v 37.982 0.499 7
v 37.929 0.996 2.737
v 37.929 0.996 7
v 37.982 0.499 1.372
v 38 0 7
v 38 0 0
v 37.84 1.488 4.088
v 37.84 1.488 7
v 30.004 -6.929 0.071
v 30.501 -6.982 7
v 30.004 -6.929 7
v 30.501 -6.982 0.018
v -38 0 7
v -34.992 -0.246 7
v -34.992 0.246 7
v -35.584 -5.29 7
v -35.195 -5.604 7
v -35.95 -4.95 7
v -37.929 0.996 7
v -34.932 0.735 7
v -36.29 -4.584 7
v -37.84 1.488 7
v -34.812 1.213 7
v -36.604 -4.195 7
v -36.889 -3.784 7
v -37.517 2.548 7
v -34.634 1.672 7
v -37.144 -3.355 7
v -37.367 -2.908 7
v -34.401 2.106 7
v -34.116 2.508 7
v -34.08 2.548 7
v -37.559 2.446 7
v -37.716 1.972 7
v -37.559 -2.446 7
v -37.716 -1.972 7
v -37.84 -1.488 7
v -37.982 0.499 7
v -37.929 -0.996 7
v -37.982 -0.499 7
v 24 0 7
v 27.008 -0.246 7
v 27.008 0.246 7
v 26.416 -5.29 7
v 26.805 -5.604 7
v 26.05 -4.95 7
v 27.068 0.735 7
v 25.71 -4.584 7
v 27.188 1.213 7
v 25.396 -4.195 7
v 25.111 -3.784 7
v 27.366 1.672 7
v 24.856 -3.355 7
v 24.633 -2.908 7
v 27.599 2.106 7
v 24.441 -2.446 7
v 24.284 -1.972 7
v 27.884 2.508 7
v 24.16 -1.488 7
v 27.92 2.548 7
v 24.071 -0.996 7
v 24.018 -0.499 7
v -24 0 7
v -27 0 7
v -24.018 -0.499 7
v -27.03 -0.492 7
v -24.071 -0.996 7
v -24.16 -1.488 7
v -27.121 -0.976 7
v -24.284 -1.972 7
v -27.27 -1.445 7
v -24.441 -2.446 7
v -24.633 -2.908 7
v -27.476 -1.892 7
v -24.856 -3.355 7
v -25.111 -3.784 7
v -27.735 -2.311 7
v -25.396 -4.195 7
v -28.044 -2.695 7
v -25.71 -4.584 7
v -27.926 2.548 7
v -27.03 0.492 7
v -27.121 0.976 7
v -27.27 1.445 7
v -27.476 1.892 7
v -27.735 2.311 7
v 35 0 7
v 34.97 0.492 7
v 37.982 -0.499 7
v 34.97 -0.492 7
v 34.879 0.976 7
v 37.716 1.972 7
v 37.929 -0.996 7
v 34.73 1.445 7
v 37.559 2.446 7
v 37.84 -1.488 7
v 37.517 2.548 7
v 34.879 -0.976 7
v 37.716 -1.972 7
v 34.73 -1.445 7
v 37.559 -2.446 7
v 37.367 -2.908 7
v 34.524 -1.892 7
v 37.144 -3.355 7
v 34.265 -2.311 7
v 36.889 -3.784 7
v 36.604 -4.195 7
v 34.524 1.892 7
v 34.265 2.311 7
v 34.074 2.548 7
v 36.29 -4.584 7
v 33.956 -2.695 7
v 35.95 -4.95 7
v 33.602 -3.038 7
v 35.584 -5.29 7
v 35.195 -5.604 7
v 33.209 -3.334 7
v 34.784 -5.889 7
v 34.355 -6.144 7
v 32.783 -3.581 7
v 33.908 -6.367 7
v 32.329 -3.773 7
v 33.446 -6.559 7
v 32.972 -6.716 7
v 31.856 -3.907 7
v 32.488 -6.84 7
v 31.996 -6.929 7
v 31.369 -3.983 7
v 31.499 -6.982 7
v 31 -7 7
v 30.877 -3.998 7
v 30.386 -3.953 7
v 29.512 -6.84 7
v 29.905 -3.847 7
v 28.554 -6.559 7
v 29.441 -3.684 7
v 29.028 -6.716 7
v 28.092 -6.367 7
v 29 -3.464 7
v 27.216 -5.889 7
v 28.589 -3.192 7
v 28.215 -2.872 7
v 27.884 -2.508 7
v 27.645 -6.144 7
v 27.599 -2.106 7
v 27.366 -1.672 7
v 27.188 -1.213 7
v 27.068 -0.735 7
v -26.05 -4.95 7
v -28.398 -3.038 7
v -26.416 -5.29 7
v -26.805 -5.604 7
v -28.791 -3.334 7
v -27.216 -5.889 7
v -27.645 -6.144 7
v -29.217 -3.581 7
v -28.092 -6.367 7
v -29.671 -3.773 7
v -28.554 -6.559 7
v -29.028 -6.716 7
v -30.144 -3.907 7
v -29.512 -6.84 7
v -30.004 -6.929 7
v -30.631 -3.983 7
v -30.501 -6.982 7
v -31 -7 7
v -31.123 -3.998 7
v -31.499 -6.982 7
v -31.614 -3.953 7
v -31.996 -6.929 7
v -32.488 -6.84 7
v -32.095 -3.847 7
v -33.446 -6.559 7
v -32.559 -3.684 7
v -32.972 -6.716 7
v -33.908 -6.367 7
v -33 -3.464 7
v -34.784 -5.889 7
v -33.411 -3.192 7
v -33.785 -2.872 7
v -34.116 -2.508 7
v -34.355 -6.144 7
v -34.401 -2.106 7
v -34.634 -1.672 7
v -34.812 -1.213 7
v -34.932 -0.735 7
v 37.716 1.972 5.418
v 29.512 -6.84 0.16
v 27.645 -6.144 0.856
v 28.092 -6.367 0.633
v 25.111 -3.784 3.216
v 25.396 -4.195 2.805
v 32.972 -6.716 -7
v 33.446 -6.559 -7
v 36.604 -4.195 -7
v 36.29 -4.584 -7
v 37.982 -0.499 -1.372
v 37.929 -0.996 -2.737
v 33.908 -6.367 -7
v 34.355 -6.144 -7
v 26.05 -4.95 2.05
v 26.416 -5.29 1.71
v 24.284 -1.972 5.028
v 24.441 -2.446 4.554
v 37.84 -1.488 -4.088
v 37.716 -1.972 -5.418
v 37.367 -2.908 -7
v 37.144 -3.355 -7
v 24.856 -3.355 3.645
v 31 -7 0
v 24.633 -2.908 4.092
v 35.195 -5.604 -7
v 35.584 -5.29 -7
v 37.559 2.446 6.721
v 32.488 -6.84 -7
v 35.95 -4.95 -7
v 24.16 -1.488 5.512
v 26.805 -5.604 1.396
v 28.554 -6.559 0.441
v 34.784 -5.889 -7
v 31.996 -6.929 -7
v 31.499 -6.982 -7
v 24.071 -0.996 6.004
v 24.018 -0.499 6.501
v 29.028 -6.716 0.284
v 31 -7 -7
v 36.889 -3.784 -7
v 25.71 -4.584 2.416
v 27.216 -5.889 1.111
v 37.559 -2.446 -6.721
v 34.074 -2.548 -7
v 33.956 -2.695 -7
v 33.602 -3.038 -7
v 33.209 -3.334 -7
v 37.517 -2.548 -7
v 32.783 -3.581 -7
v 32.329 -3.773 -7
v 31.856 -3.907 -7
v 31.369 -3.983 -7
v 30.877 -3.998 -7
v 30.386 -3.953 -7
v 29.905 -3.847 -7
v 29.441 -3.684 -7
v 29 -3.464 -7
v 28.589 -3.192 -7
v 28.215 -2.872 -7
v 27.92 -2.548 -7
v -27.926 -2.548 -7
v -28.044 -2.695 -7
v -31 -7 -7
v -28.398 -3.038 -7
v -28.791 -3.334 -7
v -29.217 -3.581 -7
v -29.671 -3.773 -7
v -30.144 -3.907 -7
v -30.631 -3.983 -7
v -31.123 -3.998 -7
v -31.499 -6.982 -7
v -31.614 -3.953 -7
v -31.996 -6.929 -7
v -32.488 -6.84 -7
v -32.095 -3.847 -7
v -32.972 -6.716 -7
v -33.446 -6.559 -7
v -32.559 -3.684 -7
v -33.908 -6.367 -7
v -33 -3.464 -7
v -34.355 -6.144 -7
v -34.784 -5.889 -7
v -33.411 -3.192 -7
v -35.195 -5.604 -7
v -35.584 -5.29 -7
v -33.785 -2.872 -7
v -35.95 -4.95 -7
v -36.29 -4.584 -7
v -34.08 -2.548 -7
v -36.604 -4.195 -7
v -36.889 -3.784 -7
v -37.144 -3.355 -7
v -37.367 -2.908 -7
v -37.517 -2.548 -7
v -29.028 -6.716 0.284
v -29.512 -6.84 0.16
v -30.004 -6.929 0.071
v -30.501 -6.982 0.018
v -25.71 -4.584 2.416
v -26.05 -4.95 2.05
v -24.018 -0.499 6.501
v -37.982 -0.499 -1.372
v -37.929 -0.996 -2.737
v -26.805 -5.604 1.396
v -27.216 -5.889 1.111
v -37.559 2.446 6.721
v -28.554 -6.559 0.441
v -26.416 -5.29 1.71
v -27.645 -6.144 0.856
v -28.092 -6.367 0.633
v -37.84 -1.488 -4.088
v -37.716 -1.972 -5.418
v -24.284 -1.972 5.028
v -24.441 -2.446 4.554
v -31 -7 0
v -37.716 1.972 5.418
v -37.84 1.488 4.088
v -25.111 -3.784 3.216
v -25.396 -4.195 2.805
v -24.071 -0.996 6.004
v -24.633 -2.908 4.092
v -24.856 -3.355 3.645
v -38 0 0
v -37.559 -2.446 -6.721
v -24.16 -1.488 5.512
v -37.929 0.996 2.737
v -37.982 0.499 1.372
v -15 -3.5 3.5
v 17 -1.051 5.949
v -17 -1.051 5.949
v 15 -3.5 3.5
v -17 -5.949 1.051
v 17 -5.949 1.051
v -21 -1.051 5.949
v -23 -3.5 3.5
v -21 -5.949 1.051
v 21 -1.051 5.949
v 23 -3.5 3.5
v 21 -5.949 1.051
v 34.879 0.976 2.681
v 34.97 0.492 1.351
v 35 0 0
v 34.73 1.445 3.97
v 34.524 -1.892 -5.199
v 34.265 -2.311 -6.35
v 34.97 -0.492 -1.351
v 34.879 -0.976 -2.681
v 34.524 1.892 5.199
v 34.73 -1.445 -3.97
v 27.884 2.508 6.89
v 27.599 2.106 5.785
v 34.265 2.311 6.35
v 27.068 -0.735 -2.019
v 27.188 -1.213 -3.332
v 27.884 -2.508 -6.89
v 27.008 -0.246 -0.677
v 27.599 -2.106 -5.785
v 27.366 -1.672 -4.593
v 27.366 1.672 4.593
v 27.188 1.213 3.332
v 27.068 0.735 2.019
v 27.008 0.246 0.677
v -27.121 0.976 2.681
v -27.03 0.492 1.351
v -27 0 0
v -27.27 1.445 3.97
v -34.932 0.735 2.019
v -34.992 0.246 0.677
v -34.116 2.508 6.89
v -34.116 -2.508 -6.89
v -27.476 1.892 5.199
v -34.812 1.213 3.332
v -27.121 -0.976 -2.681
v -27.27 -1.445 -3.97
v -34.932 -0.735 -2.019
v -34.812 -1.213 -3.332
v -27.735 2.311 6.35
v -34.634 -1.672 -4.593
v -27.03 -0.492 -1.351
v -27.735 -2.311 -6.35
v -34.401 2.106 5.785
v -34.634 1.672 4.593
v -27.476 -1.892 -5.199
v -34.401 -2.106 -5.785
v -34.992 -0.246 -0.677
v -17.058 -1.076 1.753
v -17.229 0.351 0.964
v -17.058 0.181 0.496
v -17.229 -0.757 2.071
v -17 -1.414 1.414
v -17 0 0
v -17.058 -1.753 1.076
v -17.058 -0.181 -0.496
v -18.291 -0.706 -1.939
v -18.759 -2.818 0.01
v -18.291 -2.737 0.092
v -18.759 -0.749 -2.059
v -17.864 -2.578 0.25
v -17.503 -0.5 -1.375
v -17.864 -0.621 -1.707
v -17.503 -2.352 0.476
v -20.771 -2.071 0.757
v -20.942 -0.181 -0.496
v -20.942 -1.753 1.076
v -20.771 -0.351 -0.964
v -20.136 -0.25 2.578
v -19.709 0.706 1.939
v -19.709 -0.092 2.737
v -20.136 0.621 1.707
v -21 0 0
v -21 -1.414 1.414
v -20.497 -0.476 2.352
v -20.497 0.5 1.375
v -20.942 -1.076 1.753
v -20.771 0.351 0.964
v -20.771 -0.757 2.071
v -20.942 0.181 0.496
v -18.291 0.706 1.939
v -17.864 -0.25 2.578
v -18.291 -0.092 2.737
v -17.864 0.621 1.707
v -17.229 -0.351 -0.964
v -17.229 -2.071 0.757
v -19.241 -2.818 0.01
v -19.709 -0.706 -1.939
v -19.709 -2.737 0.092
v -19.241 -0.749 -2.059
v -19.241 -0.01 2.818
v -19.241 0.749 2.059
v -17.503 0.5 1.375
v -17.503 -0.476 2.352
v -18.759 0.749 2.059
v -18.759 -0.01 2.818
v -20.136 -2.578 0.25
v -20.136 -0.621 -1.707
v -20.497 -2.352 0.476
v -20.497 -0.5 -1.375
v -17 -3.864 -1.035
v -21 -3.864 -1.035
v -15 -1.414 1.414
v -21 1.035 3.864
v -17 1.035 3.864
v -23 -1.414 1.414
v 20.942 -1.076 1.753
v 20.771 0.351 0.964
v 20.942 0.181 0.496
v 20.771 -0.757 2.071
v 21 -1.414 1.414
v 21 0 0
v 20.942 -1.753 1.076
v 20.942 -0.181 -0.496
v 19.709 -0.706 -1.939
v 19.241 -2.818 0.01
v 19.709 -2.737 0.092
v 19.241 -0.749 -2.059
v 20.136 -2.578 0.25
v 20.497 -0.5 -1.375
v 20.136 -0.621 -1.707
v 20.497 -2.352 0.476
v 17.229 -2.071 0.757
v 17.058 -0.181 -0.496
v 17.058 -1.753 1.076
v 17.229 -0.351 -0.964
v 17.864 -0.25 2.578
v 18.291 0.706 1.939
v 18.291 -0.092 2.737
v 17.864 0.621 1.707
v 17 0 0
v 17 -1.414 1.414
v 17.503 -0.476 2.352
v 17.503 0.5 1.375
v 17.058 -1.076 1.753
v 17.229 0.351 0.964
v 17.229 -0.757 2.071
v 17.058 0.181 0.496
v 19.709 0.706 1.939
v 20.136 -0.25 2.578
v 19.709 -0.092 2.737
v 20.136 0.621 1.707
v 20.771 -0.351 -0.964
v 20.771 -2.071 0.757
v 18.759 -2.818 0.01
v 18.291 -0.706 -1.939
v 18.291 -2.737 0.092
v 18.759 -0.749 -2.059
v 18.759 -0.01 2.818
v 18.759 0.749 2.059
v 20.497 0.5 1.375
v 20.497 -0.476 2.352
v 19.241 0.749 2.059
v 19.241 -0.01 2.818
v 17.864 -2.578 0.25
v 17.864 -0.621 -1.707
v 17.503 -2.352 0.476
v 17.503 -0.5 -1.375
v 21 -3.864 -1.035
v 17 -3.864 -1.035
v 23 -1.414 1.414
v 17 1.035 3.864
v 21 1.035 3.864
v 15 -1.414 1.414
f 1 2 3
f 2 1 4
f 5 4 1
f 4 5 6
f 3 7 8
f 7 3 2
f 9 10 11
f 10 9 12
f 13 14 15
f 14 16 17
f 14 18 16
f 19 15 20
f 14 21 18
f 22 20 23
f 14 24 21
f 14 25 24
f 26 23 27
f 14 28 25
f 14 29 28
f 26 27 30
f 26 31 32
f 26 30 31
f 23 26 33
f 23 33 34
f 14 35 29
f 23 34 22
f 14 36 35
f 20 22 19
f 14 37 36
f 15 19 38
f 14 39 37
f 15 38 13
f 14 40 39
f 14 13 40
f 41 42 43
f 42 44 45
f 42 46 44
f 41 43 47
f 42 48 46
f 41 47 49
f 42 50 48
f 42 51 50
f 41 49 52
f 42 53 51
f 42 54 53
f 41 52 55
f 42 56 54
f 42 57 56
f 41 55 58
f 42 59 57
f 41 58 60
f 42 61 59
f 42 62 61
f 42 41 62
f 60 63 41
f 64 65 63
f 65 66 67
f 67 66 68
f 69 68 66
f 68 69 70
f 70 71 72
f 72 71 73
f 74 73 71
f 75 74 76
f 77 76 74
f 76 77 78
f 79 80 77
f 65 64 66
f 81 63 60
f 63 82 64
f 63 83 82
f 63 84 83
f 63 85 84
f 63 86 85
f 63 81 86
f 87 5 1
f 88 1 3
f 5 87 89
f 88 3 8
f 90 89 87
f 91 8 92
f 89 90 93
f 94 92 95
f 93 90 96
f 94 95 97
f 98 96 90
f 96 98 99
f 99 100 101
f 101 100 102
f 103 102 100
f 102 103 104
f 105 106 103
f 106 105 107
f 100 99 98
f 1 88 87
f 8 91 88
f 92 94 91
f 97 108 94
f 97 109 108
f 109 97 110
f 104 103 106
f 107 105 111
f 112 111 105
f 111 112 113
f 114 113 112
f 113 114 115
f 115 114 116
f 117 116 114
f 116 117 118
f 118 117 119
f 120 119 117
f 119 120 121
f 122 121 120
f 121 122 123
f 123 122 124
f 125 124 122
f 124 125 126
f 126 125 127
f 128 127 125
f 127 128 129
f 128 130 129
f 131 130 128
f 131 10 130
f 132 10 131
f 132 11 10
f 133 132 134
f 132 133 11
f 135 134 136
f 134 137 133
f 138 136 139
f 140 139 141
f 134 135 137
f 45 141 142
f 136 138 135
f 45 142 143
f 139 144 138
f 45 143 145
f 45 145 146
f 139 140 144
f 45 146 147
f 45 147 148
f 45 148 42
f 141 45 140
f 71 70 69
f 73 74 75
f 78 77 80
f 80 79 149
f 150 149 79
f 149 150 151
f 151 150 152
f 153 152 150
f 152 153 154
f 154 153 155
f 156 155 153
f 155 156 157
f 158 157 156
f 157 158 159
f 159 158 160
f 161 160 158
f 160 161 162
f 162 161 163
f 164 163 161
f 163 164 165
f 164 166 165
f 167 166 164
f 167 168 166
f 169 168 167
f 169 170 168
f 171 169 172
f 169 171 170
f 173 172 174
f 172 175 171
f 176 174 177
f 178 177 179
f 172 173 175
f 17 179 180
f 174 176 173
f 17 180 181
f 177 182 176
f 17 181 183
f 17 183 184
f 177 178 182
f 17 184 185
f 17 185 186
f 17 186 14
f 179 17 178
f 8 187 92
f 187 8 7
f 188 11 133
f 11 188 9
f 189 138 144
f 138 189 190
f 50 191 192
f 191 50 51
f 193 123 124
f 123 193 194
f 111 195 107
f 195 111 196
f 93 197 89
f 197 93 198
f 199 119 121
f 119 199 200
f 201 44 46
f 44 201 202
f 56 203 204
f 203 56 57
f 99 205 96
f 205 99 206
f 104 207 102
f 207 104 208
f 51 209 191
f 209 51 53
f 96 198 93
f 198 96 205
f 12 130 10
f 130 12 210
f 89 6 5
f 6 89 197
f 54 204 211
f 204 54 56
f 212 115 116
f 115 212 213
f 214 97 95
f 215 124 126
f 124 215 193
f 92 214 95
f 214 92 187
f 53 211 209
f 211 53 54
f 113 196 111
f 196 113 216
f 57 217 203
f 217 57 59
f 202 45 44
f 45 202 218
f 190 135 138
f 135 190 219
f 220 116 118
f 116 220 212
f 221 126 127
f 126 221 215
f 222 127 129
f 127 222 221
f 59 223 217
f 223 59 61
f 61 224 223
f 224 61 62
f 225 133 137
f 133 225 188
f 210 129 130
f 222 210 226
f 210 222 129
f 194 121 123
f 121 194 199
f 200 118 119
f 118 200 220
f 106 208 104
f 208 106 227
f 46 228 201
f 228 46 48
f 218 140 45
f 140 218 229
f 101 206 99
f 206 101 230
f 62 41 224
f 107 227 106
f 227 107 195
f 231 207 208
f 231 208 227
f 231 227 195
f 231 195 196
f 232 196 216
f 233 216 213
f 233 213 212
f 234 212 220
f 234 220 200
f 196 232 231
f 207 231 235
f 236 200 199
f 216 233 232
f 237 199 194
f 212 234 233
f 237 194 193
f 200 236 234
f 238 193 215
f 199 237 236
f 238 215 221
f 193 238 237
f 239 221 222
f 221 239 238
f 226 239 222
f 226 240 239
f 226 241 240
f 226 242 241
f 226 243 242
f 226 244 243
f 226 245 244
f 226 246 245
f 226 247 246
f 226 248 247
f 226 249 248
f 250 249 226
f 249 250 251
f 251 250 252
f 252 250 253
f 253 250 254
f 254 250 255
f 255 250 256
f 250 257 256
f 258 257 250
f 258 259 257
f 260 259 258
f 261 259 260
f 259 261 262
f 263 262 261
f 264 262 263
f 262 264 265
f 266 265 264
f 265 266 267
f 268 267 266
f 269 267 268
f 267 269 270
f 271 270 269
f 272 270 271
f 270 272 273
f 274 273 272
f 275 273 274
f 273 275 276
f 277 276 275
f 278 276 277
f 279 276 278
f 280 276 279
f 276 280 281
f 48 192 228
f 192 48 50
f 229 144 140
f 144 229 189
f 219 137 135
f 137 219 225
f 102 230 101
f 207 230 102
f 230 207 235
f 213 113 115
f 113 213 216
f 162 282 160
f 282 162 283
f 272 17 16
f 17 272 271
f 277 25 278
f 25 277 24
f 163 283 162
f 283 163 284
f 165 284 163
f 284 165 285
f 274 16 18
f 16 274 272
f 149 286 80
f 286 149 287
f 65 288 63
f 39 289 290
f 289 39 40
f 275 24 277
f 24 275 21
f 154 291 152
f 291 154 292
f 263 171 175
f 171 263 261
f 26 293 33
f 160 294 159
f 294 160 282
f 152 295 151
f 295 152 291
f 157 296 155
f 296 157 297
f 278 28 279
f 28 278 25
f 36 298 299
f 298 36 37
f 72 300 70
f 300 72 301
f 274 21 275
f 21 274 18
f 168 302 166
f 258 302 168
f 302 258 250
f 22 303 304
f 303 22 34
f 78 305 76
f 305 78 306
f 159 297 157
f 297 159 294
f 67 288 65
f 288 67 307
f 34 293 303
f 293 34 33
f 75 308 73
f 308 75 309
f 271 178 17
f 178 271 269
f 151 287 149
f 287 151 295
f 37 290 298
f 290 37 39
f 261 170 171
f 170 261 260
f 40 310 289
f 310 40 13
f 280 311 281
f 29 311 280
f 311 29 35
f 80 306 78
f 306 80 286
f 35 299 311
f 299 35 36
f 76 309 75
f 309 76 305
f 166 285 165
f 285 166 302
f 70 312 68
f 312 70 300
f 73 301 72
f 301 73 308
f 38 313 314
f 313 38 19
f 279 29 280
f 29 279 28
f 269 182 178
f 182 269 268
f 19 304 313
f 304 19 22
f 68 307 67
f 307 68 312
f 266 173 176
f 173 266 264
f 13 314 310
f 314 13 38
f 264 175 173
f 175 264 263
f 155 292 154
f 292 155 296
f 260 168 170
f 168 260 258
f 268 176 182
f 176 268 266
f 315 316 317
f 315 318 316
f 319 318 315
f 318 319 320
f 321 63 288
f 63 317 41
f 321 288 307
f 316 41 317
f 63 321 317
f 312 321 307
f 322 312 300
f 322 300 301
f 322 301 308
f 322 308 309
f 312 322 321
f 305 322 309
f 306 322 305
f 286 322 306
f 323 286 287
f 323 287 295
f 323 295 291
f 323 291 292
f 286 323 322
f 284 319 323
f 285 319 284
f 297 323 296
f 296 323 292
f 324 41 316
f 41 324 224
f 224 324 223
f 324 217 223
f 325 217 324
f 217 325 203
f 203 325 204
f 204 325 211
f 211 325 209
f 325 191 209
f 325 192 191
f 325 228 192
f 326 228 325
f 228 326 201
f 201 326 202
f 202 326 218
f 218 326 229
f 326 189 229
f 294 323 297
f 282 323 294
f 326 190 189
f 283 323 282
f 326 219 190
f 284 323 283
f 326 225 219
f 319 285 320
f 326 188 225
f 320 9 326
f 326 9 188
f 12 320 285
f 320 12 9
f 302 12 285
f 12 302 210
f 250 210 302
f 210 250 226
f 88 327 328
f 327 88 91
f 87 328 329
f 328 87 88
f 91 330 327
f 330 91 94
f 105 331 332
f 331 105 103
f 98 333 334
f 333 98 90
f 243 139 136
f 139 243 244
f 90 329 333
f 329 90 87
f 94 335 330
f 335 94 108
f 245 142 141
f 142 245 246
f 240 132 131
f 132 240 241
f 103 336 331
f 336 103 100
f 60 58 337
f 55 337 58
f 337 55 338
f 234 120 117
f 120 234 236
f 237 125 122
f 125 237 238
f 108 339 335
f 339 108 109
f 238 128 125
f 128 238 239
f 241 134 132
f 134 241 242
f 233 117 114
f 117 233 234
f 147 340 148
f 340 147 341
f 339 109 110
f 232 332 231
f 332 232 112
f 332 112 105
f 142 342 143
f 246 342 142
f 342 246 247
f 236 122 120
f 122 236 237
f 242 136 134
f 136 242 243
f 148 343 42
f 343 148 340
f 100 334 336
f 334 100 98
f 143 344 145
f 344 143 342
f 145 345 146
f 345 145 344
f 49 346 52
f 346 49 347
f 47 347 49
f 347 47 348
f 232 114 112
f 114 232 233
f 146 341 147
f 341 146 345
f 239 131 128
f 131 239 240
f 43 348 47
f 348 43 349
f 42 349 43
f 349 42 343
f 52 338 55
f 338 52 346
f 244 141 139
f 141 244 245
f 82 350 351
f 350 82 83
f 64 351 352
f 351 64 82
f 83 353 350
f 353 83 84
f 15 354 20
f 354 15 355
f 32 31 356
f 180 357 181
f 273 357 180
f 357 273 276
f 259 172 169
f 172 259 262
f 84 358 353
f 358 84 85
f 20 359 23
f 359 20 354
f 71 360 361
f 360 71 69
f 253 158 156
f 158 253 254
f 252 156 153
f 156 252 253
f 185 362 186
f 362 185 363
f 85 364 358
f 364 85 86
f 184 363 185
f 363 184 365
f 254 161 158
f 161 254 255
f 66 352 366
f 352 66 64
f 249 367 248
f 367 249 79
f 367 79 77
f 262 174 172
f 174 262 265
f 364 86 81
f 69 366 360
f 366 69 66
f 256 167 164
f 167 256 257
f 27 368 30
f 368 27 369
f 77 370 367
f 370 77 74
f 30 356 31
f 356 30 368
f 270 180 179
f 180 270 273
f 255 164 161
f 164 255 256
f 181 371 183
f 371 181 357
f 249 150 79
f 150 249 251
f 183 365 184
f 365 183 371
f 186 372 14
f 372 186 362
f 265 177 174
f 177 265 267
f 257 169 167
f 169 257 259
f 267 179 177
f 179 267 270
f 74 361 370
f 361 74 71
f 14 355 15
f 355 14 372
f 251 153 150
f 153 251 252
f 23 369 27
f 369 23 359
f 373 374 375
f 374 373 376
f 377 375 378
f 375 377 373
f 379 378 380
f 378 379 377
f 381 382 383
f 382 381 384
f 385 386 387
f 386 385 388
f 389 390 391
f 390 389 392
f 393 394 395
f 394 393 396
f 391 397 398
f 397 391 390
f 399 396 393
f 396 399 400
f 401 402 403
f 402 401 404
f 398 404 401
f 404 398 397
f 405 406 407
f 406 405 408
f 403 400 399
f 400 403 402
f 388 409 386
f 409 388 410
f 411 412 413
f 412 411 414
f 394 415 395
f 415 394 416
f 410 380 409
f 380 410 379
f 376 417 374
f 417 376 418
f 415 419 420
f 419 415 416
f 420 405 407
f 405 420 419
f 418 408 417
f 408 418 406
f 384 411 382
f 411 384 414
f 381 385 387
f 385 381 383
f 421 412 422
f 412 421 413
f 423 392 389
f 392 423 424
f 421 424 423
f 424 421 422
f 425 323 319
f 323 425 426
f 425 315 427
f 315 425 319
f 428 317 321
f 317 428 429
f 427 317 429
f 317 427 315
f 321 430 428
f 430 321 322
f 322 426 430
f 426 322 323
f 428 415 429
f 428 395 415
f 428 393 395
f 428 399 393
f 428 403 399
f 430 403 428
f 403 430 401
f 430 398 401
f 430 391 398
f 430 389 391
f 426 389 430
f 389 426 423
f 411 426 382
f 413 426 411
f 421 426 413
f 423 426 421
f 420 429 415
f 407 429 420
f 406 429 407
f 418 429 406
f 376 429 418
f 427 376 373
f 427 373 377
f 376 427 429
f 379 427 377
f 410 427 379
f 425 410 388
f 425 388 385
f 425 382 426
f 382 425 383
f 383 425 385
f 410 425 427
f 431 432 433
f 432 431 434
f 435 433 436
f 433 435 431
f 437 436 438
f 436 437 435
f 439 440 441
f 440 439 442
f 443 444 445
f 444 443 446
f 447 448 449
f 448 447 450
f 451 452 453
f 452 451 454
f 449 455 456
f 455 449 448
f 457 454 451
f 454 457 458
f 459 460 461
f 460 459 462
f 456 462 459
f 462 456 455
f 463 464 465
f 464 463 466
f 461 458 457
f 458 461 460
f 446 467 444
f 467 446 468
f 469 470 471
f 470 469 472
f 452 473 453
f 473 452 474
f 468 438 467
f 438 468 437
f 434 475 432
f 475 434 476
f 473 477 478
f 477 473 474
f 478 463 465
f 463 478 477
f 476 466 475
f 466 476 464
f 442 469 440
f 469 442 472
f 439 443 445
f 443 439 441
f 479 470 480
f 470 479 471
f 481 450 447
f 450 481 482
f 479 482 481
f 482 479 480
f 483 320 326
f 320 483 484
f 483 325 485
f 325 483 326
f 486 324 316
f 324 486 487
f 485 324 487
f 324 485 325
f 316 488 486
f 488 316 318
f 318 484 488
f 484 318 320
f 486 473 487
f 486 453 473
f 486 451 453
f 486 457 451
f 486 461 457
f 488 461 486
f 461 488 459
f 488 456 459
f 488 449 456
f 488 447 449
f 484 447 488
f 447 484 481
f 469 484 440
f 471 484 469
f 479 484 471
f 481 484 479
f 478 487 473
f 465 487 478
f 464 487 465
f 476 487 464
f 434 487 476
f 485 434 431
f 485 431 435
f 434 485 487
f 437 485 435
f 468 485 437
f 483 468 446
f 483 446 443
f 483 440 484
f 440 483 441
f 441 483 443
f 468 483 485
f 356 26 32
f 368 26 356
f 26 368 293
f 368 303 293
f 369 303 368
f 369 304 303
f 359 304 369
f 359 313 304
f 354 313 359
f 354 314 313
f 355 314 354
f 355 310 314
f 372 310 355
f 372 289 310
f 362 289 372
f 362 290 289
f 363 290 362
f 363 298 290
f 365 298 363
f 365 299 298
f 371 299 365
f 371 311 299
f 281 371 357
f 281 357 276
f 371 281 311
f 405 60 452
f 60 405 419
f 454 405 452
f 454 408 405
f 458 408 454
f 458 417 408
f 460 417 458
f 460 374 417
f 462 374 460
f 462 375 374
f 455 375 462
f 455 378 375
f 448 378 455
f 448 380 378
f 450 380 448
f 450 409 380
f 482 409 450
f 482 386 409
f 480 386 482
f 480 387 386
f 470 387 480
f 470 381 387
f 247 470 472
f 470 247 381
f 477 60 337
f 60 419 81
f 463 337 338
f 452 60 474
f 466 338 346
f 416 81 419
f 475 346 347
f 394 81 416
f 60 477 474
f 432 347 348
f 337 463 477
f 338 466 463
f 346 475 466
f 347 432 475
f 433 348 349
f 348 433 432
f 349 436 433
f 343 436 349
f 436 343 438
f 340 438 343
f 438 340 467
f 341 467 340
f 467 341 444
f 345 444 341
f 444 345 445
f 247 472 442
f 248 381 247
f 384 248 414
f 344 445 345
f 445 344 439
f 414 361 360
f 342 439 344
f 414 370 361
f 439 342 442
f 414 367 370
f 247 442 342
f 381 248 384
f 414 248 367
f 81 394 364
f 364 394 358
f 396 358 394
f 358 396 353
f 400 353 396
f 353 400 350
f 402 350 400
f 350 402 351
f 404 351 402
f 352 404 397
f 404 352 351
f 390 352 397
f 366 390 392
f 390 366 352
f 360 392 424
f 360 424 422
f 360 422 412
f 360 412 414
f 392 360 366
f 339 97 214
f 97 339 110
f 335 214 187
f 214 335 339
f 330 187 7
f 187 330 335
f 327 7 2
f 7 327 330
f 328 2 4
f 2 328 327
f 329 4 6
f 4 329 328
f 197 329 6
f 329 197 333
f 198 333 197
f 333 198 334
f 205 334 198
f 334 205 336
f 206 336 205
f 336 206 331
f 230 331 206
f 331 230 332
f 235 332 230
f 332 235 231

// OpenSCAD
// Upper rail parts of OpenAutoLab: mounting brackets for valves, for pumps and for electronic enclosure
//
// Copyright (c) 2023-2024 Kauzerei <mailto:openautolab@kauzerei.de>
//
// This program is free software: you can redistribute it and/or modify
// it under the terms of the GNU General Public License as published by
// the Free Software Foundation, either version 3 of the License, or
// (at your option) any later version.
//
// This program is distributed in the hope that it will be useful,
// but WITHOUT ANY WARRANTY; without even the implied warranty of
// MERCHANTABILITY or FITNESS FOR A PARTICULAR PURPOSE. See the
// GNU General Public License for more details.
//
// You should have received a copy of the GNU General Public License
// along with this program. If not, see <https://www.gnu.org/licenses/>.

$fs=0.5/1;
$fa=1/1;
part = "Valve_bracket"; // [Valve_bracket, Main_pump_bracket, Filter_pump_type1_bracket, Filter_pump_type2_bracket, Filter_attachment, Small_bracket, battery_holder]
/* [Rail general parameters] */
rod_diameter=8;
rods_distance=62;

/* [mounts parameters] */
part_width=10;
part_thickness=3;
air_gap=1;
valve_offset=0;
pump_offset=5;
mount_hole=4;
mount_hole_distance=38;
pcb_angle=15;
pcb_holes_distance=67.32;
extra_room=7;

/* [Filter attachment options] */
filter_wall=6;
offset_v=20;
offset_h=12;
hole=9;

battery_h=78;
battery_w=78;
battery_d=23;

module hole() { //hole for clamping with threaded screw
  cylinder(d=mount_hole,h=2*rods_distance,center=true);
  mirror([0,0,1])cylinder(d=mount_hole*2,h=2*rods_distance,$fn=6);
}

module pumpholes() {
  translate([rods_distance/2,0,0])circle(d=rod_diameter);
  translate([-rods_distance/2,0,0])circle(d=rod_diameter);
  translate([0,10])rotate([0,0,-50]) {
    translate([31,0])circle(d=4);
    translate([-21,0])circle(d=4);
    translate([0,0])circle(d=34);
  }
}

module main_pump_bracket() {
  pumpmounts=[[21,0],[-31,0]];
  rodmounts=[[rods_distance/2,0],[-rods_distance/2,0]];
  shift=[-5,-6];
  rotation=140;
  pumpdiameter=34;
  difference() {
    union() {
      hull() {
        translate(shift)rotate([0,0,rotation])for (i=pumpmounts) translate(i)cylinder(h=part_width,d=mount_hole+2*part_thickness,center=true);
        for (i=rodmounts) translate(i)cylinder(h=part_width,d=rod_diameter+2*part_thickness,center=true);
        translate(shift)rotate([0,0,rotation])cylinder(h=part_width,d=pumpdiameter+2*part_thickness,center=true);
      }
      translate(shift)rotate([0,0,rotation])for (i=pumpmounts) translate(i)translate([0,0,pump_offset/2])cylinder(h=part_width+pump_offset,d=mount_hole+2*part_thickness,center=true);
    }
    translate(shift)rotate([0,0,rotation])for (i=pumpmounts) translate(i)cylinder(h=part_width+2*pump_offset+0.02,d=mount_hole,center=true);
    for (i=rodmounts) translate(i)cylinder(h=part_width+0.02,d=rod_diameter,center=true);
    translate(shift)rotate([0,0,rotation])cylinder(h=part_width+2*pump_offset+0.02,d=pumpdiameter,center=true);
    cube([2*rods_distance,air_gap,part_width+2],center=true);
    *translate([18,0,0])rotate([90,0,-10]) cylinder (d=4,h=2*rods_distance,center=true);
    rotate([-90,0,-14])translate([18,0,-part_thickness]) hole();
  }
}

module pump_shape(type) {
  if (type==1) hull(){
    circle(d=34);
    translate([17,-9])circle(d=8);
    translate([17,9])circle(d=8);
    translate([-17,-9])circle(d=8);
    translate([-17,9])circle(d=8);
  }
  if (type==2) hull(){
    translate([14,-14])circle(d=8);
    translate([-14,-14])circle(d=8);
    translate([14,14])circle(d=8);
    translate([-14,14])circle(d=8);
  }
}

module filterpump(type) {
  difference() {
    linear_extrude(height=part_width,convexity=4)difference() {
      offset (r=part_thickness) hull() {
        pump_shape(type);
        translate([rods_distance/2,9])circle(d=rod_diameter);
        translate([-rods_distance/2,9])circle(d=rod_diameter);
      }
    pump_shape(type);
    translate([rods_distance/2,9])circle(d=rod_diameter);
    translate([-rods_distance/2,9])circle(d=rod_diameter);
    translate([0,9])square([2*rods_distance,1],center=true);
    }
  translate([rods_distance/2-rod_diameter/2-2,0,part_width/2])rotate([-90,0,0])hole();
  translate([-rods_distance/2+rod_diameter/2+2,0,part_width/2])rotate([-90,0,0])hole();
*  translate([-rods_distance/2+rod_diameter/2+3,0,part_width/2])rotate([90,0,0])cylinder(d=4,h=rods_distance,center=true);
  }
}

module filter_attachment() {
  cube([part_thickness,2*hole,offset_v+part_thickness]);
  tail=min(20,offset_v+part_thickness);
  translate([-part_thickness-filter_wall,0,offset_v+part_thickness-tail])cube([part_thickness,2*hole,tail]);
  translate([-filter_wall,0,offset_v])cube([filter_wall,2*hole,part_thickness]);
  difference() {
    cube([offset_h+hole ,2*hole,part_thickness]);
    translate([offset_h,hole,part_thickness/2])cylinder(h=part_thickness+0.02,d=hole,center=true);
  }
}

module top_holder() {
  difference() {
    union() {
      cylinder(d=part_thickness*2+air_gap+rod_diameter,h=part_width);
      translate([-rod_diameter/2-part_width,-part_thickness-rod_diameter/2-air_gap/2,0]) cube([rod_diameter+2*part_width,2*part_thickness+rod_diameter+air_gap,part_width]);
    }
    translate([0,0,-1/100])cylinder(d=rod_diameter,h=part_width+1/50);
    translate([-rod_diameter/2-part_width-1/100,-air_gap/2,-1/100]) cube([rod_diameter+2*part_width+1/50,air_gap,part_width+1/50]);
    translate([rod_diameter/2+part_width/2,part_thickness/2+rod_diameter/4+air_gap/2,part_width/2])rotate([90,0,0])hole();
    translate([-rod_diameter/2-part_width/2,part_thickness/2+rod_diameter/4+air_gap/2,part_width/2])rotate([90,0,0])hole();
  }
}

module battery_holder() {
  difference() {
    union() {
      cube([battery_w+part_thickness,23+part_thickness,battery_h+part_thickness/2]);
      translate([-part_width,0,0])cube([battery_w+part_thickness+2*part_width,part_thickness/2,battery_h+part_thickness/2]);
    }
    translate([part_thickness/2,part_thickness/2,part_thickness/2+0.01]) cube([battery_w,23,battery_h]);
    for (tr=[[-part_width/2,-0.01,extra_room],
             [part_thickness+part_width/2+battery_w,-0.01,extra_room],
             ])
      translate(tr)rotate([-90,0,0]) cylinder(d=mount_hole,h=part_thickness/2+0.02);
  }
}

module valve_bracket() {
  sq=rod_diameter+2*part_thickness;
  difference() {
    union() {
    for (tr=[[rods_distance/2,0,0],[-rods_distance/2,0,0]]) translate(tr)
      cylinder(d=sq, h=sq, center=true);
    hull() for (tr=[[0,sq/4,sq/4],[0,-sq/4,-sq/4]])
      translate(tr) cube([rods_distance,sq/2,sq/2],center=true);
    }
    for (tr=[[rods_distance/2,0,0],[-rods_distance/2,0,0]]) translate(tr)
      cylinder(d=rod_diameter, h=sq+1/100, center=true);
    rotate([-20,0,0]) translate([0,sq/2+air_gap/4,0]) cube([rods_distance+rod_diameter+2*part_thickness+1/100,sq+air_gap/2,2*sq],center=true);
    for (tr=[[-mount_hole_distance/2,0,2],[mount_hole_distance/2,0,2]]) rotate([45,0,0]) translate(tr) {
      cylinder(d=mount_hole,h=2*sq,center=true);
      cylinder(d=mount_hole*2,h=sq,$fn=6);
    }
  }
}

if (part=="Valve_bracket") valve_bracket();
if (part=="Main_pump_bracket") main_pump_bracket();
if (part=="Filter_pump_type1_bracket") filterpump(1);
if (part=="Filter_pump_type2_bracket") filterpump(2);
if (part=="Filter_attachment") filter_attachment();
if (part=="Small_bracket") top_holder();
if (part=="battery_holder") battery_holder();
